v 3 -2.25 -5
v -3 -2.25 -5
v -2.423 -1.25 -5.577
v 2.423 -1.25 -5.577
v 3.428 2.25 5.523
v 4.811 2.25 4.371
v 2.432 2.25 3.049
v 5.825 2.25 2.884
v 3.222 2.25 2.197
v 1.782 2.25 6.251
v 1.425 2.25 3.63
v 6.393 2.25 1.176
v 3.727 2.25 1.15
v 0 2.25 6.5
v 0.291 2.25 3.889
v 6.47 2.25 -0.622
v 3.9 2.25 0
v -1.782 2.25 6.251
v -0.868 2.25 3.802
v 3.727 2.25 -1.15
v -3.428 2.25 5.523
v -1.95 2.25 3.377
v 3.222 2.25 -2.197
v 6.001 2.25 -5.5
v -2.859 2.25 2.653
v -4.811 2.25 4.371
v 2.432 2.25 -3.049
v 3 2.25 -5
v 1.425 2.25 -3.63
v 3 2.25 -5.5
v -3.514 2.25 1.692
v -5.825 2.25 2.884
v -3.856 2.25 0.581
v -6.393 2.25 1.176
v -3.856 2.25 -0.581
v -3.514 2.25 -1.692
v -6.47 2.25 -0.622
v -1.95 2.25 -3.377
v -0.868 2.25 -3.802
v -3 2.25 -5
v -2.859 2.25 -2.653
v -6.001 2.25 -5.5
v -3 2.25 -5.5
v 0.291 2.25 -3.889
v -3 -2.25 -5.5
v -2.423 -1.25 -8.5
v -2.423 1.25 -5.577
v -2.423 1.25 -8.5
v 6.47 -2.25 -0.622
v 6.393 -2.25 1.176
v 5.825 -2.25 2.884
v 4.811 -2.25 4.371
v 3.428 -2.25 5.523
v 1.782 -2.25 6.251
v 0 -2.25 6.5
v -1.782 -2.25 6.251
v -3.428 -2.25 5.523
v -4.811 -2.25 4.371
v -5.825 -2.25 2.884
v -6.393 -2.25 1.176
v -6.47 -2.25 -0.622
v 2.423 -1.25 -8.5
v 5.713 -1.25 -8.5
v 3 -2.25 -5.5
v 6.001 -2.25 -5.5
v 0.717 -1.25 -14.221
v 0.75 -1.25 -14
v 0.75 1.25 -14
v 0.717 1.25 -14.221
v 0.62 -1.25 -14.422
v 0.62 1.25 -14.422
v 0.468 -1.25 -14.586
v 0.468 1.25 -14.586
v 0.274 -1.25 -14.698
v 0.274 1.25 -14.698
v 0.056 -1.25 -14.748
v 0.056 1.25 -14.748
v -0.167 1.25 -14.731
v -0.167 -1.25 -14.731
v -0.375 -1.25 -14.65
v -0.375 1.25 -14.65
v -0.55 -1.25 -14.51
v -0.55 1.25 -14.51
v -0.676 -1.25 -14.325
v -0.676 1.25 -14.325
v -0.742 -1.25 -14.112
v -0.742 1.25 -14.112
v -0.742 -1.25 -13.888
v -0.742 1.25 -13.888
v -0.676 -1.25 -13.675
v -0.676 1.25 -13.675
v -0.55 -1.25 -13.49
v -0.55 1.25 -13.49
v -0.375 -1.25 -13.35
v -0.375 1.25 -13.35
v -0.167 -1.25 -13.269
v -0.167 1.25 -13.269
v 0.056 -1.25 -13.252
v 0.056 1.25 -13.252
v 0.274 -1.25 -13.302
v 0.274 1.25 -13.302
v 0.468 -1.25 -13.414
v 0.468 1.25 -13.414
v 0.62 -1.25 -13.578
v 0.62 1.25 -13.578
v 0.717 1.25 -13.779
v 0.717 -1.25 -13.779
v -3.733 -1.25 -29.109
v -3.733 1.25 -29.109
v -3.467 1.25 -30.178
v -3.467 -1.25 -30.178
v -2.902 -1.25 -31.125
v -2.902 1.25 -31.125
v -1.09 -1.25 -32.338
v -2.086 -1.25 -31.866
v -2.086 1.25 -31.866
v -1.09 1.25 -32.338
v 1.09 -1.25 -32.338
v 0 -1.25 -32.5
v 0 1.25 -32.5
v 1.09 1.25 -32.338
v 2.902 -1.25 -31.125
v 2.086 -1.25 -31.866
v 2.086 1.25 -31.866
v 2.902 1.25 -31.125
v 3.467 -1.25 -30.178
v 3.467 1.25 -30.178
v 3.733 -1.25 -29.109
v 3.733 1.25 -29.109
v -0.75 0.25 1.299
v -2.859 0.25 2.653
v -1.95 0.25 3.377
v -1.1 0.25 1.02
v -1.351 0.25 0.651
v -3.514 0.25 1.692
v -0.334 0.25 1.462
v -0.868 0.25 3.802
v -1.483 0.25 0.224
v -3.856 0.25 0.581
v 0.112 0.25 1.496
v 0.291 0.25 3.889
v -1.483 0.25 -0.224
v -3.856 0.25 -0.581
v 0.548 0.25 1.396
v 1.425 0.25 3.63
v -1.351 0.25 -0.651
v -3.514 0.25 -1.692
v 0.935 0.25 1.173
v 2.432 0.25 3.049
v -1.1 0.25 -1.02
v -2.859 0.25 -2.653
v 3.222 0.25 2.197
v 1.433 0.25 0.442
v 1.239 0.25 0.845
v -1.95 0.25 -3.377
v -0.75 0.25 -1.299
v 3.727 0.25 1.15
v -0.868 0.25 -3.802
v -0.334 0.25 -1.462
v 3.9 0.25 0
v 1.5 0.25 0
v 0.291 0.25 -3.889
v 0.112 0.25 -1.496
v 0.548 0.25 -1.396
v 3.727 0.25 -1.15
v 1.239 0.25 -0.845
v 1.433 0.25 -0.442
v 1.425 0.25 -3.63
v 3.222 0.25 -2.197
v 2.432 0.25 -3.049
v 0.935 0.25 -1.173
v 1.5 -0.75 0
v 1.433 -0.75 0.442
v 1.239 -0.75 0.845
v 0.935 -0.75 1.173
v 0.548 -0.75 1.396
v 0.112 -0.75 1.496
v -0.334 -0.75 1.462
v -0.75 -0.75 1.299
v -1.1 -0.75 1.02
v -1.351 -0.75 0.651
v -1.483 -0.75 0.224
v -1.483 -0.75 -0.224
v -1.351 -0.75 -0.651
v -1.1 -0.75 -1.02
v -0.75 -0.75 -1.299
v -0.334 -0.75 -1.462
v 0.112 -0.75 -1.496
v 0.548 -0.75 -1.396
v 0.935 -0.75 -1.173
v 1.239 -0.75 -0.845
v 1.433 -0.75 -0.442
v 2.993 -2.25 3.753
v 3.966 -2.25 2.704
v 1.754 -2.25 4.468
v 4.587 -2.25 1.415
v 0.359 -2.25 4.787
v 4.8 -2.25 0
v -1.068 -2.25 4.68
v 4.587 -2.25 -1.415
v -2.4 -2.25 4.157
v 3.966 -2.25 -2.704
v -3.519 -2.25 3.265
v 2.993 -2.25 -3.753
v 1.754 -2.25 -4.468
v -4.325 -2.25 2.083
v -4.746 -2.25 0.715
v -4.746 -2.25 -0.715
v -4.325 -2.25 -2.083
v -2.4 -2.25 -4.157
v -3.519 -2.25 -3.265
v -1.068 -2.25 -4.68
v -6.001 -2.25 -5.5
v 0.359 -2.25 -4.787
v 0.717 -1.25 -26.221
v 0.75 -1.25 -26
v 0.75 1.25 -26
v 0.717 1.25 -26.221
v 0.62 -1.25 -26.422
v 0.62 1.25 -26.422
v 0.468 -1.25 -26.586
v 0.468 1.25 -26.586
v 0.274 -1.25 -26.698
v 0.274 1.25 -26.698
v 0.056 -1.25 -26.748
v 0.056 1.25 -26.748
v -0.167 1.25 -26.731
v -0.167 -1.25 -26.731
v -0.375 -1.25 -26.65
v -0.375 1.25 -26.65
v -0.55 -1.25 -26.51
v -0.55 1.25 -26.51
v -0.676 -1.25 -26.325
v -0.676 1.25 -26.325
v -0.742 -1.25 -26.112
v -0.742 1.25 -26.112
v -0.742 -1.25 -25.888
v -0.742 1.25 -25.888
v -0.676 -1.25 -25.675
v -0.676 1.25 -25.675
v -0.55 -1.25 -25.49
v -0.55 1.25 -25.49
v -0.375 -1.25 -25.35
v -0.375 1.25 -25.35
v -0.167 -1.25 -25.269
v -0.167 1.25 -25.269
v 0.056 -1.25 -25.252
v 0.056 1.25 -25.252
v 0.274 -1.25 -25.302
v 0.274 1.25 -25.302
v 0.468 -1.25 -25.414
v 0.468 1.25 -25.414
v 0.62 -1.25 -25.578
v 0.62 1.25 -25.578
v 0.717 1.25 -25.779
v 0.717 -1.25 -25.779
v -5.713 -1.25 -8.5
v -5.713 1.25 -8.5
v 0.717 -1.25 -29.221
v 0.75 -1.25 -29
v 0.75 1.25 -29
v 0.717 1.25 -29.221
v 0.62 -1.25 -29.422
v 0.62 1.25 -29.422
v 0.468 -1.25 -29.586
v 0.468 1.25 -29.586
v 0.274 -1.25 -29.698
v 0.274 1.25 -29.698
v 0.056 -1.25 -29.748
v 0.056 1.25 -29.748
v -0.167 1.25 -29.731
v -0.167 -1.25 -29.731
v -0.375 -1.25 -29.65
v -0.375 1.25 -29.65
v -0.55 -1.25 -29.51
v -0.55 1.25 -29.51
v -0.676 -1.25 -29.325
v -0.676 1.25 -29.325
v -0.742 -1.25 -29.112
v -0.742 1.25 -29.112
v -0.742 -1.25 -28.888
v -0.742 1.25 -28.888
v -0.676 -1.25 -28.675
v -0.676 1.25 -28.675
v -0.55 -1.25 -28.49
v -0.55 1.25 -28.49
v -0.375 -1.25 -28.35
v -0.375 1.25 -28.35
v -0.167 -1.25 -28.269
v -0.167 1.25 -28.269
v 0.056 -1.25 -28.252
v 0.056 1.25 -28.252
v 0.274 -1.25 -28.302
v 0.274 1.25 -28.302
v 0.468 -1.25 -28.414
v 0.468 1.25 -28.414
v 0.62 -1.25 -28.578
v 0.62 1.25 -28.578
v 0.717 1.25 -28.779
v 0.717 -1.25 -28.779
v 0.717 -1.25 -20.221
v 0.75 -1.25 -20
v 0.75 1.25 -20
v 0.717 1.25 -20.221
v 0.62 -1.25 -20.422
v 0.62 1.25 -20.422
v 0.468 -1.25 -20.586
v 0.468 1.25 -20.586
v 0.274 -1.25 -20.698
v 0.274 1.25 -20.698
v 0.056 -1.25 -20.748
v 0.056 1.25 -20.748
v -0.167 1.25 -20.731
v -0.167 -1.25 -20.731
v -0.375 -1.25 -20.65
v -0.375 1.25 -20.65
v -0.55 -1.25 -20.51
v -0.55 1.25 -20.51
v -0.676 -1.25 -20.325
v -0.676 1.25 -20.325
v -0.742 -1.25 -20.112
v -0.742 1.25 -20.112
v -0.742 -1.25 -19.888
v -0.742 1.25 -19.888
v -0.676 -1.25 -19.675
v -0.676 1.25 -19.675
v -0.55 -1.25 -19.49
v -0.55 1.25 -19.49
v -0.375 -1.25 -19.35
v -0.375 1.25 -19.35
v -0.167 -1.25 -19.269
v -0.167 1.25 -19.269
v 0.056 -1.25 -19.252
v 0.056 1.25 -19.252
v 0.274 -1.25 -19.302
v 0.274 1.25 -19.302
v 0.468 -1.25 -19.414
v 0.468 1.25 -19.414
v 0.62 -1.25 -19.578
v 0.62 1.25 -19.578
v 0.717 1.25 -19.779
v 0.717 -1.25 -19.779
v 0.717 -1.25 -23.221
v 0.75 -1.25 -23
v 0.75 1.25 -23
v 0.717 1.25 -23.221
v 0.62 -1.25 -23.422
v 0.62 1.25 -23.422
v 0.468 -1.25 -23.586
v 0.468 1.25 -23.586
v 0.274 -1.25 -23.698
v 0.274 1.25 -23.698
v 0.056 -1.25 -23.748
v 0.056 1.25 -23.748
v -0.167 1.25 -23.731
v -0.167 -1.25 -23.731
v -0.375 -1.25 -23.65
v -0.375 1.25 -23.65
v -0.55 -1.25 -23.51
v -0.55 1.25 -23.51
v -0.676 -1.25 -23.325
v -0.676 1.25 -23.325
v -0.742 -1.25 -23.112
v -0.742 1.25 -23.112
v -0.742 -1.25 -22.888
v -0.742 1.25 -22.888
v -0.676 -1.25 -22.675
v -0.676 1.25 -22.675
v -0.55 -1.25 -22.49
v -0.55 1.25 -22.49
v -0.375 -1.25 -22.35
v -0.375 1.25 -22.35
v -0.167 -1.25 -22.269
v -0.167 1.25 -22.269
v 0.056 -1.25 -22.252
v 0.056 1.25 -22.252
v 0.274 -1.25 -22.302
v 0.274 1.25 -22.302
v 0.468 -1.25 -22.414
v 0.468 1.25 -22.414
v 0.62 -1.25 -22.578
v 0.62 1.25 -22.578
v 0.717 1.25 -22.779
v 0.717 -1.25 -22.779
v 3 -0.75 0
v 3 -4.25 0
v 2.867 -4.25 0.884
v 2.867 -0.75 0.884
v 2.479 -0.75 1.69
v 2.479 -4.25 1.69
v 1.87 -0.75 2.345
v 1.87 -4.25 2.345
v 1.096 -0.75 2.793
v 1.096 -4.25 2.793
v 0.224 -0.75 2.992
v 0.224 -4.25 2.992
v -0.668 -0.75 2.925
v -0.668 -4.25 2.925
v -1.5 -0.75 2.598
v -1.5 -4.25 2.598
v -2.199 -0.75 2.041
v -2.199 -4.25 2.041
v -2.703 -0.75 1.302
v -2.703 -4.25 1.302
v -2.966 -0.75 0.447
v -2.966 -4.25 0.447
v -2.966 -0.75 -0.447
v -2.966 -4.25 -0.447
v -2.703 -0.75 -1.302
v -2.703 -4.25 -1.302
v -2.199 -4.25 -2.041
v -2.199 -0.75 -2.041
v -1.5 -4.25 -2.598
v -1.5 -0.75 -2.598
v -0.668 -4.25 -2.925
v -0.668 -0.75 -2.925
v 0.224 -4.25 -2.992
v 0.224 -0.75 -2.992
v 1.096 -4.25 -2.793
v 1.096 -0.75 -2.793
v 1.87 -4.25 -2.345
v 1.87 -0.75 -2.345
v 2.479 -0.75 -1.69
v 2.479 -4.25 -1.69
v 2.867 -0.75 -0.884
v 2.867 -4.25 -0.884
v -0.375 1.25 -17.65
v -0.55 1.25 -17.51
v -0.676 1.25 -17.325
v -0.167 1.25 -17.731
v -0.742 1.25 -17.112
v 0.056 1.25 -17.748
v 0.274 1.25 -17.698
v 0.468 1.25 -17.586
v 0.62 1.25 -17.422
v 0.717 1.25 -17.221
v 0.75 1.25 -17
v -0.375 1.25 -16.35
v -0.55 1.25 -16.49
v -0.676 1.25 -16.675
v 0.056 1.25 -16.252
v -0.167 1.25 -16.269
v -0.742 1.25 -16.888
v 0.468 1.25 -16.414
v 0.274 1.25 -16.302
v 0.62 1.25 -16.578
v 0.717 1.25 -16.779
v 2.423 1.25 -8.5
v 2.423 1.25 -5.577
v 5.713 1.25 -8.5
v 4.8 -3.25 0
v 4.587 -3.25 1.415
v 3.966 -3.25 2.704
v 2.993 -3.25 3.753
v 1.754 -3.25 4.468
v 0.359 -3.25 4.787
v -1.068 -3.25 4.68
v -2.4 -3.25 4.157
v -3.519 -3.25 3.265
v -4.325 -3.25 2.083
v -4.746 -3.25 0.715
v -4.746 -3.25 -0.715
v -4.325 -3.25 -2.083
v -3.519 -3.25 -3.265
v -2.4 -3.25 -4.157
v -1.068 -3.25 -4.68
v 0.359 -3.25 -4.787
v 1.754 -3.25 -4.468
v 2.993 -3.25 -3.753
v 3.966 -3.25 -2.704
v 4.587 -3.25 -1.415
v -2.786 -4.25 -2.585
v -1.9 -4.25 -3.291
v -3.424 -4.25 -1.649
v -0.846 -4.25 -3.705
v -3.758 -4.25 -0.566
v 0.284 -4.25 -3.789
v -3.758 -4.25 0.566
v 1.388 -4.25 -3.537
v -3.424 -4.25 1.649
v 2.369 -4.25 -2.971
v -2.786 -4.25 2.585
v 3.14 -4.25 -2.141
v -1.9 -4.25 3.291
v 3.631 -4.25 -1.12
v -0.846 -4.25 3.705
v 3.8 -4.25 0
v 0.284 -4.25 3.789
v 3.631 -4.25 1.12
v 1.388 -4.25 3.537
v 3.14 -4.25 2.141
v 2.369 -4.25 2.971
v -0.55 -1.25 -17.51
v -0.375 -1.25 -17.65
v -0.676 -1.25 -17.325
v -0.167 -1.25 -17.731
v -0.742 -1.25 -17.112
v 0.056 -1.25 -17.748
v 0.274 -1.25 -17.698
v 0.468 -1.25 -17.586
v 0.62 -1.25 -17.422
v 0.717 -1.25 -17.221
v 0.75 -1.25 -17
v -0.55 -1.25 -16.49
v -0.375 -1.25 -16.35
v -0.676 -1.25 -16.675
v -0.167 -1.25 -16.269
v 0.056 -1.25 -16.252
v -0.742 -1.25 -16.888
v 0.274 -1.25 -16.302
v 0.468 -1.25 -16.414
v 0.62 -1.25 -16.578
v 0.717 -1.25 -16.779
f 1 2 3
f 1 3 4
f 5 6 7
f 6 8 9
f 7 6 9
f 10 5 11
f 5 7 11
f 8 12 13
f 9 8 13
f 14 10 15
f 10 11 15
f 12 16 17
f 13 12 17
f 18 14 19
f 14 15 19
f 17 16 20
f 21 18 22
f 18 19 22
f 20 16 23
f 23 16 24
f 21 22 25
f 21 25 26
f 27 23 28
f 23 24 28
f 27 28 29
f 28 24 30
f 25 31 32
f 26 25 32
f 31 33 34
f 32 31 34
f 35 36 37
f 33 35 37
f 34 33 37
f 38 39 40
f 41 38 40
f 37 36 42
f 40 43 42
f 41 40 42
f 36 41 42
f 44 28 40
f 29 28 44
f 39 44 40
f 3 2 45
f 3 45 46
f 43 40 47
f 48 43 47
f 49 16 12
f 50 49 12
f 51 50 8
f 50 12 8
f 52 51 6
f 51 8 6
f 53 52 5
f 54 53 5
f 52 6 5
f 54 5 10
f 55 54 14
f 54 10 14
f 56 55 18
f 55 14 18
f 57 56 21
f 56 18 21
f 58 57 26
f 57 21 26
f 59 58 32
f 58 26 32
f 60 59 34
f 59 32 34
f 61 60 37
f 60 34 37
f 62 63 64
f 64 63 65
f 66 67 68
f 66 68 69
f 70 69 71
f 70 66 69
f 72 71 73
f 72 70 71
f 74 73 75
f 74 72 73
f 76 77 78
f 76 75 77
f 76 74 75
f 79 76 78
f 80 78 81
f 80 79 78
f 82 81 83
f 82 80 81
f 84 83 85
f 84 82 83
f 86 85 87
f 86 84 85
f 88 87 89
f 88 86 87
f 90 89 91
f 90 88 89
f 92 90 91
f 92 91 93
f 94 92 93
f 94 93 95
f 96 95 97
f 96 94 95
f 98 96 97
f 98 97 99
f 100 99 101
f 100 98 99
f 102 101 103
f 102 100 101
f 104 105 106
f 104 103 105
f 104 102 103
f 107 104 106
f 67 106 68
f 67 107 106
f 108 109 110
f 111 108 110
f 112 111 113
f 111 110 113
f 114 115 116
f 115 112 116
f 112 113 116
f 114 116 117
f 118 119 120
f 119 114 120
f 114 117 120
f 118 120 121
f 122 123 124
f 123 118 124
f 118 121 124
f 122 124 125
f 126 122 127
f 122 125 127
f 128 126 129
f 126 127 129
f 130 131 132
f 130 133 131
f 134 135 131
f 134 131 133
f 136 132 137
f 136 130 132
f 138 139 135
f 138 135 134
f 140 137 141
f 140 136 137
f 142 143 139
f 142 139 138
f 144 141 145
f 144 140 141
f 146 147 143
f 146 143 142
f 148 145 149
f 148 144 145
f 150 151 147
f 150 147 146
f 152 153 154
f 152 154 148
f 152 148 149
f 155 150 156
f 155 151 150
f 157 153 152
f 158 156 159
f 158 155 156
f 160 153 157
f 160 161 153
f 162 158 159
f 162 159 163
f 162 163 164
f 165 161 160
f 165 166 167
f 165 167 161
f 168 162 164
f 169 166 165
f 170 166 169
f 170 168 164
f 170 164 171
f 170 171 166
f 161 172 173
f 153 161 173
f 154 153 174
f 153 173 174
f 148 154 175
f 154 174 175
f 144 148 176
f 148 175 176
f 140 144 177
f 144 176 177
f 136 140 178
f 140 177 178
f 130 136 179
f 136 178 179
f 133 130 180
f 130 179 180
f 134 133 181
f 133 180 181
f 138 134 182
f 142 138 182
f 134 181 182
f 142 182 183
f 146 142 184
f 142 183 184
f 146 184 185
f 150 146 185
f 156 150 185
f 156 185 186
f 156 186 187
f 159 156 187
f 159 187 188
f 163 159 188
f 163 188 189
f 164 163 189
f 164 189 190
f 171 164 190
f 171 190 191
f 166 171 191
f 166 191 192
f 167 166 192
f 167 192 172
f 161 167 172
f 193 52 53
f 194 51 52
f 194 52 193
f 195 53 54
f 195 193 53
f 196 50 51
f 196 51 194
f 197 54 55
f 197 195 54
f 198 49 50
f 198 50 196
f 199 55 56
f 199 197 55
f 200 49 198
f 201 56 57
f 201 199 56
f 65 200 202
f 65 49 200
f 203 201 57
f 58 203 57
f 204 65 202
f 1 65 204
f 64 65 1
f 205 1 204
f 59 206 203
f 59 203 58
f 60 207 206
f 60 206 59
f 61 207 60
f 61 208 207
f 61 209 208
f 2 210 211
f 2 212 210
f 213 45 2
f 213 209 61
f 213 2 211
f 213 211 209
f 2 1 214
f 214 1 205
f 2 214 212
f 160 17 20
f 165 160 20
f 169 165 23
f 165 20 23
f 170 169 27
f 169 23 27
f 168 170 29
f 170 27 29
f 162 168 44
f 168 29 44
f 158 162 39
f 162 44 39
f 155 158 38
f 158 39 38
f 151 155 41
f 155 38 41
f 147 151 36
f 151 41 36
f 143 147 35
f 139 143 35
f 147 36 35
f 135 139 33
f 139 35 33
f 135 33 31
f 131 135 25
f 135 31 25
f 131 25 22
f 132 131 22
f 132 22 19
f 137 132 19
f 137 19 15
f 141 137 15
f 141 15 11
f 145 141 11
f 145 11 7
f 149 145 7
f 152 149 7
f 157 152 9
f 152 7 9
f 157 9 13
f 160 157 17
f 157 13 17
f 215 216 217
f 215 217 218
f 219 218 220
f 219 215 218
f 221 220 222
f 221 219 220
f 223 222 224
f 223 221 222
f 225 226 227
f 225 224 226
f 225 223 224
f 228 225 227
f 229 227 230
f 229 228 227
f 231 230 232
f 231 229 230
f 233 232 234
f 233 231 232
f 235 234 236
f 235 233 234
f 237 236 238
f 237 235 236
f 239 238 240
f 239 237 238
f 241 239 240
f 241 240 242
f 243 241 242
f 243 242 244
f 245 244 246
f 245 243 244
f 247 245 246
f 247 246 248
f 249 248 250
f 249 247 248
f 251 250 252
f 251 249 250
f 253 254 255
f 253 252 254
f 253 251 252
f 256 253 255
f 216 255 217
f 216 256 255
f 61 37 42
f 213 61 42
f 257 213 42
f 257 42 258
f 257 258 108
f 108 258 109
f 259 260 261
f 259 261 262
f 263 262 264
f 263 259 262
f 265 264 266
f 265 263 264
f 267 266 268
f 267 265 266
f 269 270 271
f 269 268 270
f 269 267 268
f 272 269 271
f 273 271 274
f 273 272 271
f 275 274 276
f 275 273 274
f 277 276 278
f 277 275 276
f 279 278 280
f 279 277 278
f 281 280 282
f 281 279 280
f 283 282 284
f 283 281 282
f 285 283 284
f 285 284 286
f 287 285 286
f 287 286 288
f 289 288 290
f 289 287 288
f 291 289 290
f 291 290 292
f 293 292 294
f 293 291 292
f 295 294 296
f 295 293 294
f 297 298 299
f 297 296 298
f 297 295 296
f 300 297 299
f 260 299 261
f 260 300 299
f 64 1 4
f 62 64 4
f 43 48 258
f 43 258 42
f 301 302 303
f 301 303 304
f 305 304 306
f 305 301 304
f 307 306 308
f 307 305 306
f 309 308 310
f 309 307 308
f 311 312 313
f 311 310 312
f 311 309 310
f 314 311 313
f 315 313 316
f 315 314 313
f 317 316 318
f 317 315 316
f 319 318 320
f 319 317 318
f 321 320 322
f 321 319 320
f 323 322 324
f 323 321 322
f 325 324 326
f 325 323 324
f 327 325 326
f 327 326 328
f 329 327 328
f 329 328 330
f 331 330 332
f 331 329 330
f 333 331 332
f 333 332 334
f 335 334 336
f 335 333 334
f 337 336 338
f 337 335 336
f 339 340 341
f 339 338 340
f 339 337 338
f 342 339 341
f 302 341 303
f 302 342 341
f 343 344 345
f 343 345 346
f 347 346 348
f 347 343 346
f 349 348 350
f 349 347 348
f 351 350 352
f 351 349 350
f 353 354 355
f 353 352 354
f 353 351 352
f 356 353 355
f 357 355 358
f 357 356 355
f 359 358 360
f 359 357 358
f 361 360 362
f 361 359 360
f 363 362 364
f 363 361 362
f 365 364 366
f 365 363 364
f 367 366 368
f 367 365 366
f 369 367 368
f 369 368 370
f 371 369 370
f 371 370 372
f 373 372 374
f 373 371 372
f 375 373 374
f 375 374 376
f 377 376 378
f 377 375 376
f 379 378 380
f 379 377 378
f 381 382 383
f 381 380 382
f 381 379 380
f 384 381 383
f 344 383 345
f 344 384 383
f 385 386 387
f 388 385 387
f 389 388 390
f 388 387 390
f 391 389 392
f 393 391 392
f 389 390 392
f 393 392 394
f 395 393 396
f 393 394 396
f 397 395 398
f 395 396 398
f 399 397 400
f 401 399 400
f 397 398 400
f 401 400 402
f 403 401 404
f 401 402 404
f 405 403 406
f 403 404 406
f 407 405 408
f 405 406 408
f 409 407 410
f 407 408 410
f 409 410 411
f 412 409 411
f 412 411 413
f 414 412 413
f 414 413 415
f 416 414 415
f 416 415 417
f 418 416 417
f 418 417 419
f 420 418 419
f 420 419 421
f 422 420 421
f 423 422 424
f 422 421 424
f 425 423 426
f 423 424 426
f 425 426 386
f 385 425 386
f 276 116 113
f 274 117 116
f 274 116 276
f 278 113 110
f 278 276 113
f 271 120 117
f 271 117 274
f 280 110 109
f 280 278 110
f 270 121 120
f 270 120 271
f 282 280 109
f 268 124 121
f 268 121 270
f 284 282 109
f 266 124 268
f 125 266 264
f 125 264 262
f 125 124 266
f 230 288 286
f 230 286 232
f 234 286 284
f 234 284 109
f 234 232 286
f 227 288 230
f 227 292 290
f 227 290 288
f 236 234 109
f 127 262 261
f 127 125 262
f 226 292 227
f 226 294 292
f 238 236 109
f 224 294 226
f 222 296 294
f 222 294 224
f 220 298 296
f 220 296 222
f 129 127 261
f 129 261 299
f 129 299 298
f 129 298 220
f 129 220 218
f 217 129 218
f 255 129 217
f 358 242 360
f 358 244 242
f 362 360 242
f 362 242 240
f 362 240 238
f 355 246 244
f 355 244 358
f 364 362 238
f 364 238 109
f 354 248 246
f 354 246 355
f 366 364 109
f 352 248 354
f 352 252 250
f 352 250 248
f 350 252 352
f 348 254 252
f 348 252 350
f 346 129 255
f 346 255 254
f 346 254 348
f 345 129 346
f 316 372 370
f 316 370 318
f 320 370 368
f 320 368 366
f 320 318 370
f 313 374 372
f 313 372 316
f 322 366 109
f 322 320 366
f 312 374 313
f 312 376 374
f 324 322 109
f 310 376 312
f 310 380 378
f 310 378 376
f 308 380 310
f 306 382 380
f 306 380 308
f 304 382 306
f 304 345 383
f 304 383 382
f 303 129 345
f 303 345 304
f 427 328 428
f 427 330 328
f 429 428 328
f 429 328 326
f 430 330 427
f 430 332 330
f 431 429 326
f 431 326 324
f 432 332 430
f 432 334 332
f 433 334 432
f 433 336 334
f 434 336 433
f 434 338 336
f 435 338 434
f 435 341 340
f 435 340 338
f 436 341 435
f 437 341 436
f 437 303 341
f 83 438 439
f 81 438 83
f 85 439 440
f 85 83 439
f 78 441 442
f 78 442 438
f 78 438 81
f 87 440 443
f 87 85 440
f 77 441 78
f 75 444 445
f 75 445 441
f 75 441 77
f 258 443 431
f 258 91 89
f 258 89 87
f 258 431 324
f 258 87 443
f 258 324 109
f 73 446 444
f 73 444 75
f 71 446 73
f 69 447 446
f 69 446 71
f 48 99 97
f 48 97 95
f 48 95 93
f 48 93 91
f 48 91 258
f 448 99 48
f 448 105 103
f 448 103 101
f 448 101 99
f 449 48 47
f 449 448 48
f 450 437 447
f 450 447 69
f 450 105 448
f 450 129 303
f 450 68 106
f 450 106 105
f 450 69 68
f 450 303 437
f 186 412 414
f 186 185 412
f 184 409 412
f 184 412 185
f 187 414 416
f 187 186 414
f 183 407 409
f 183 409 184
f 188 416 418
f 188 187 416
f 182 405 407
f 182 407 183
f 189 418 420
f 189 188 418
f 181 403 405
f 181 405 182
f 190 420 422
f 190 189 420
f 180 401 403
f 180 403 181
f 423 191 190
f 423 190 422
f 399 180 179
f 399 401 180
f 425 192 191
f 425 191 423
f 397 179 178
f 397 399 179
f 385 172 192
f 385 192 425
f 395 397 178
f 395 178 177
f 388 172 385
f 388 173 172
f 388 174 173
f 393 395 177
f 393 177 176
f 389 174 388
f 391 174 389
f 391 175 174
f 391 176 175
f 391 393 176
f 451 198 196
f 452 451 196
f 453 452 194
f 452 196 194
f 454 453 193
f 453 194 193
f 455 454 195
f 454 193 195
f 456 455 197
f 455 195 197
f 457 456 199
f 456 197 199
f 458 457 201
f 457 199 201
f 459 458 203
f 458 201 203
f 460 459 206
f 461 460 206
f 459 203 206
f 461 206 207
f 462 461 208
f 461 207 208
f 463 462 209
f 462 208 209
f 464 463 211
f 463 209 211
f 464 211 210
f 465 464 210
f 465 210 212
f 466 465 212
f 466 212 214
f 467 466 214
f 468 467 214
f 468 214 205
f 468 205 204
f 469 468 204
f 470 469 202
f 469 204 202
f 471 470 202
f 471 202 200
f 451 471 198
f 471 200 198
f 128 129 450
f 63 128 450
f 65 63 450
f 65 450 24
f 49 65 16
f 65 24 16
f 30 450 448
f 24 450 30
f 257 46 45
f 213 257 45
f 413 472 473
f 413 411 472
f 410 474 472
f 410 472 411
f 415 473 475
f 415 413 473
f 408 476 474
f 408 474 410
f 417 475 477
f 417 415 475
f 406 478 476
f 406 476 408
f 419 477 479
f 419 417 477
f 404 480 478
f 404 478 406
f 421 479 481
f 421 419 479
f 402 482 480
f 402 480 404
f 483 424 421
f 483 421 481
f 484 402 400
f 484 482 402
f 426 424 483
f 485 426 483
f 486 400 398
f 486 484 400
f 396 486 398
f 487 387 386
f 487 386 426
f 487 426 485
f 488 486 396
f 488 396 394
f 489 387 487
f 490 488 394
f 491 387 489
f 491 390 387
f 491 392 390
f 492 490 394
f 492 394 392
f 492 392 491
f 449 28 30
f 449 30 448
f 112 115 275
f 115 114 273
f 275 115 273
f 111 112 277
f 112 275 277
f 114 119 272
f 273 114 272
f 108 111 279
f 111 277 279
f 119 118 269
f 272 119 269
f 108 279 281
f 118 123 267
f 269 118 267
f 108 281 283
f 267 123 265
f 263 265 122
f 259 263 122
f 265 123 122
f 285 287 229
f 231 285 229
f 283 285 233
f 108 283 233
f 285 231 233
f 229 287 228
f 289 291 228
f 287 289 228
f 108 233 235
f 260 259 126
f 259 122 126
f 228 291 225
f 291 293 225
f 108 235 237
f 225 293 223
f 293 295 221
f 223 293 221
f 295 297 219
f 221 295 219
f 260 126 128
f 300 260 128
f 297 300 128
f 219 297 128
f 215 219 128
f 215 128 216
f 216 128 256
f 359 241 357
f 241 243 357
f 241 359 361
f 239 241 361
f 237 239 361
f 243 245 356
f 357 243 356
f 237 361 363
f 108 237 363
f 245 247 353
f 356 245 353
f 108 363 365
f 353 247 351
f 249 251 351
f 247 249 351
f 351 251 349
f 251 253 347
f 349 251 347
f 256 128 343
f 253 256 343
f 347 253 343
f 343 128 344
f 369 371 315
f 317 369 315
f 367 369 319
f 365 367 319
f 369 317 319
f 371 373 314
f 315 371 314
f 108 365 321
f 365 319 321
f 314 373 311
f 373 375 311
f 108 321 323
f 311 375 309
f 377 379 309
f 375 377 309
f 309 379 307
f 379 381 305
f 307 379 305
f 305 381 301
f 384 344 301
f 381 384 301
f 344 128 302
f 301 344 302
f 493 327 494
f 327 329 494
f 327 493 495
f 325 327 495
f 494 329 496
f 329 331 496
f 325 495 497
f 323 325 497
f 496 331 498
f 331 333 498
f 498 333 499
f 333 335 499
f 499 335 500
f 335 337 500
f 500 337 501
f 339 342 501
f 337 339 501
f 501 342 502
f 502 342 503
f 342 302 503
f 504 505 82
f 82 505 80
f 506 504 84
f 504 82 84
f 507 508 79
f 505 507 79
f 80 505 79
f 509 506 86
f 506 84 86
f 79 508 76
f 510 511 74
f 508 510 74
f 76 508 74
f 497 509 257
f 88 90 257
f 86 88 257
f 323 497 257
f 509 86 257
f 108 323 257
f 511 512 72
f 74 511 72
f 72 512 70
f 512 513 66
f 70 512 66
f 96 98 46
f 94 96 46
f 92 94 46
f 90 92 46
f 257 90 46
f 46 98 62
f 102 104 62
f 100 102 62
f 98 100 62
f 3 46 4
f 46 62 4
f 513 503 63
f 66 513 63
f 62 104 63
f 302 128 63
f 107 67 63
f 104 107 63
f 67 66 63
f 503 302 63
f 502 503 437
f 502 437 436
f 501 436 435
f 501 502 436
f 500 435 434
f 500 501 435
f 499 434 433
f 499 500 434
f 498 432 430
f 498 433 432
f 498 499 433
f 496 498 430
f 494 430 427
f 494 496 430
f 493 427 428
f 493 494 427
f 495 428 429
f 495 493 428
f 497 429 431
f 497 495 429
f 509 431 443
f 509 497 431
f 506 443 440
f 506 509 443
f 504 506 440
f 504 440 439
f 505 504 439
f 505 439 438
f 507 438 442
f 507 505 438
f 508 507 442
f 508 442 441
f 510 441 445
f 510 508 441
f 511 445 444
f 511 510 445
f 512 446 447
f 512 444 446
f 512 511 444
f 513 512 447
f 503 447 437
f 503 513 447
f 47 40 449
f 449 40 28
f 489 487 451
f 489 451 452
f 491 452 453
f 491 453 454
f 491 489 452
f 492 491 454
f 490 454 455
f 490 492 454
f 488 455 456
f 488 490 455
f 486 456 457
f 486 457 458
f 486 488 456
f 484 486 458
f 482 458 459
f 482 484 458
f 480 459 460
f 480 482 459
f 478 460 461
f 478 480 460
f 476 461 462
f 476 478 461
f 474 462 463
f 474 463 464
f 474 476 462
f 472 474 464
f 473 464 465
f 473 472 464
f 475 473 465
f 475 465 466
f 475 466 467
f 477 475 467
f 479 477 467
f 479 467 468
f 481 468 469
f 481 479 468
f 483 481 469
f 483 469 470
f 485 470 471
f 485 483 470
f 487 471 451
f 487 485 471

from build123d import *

# Parameters (mm, degrees)
SKETCH1_R           = 0.75
BOSS_EXTRUDE1_DEPTH = 2.25
CUT_EXTRUDE1_DEPTH  = 7
SKETCH3_W           = 6
SKETCH3_H           = 3.5
CUT_EXTRUDE2_DEPTH  = 1
DRAFT1_ANGLE        = 30
DRAFT2_ANGLE        = 30
SKETCH4_R           = 3.9
CUT_EXTRUDE3_DEPTH  = 2
SKETCH5_R           = 4.8
BOSS_EXTRUDE2_DEPTH = 2
CHAMFER1_SIZE       = 1
SKETCH6_R           = 3
CUT_EXTRUDE4_DEPTH  = 3.5
SKETCH7_R           = 1.5
CUT_EXTRUDE5_DEPTH  = 4


with BuildPart() as part:
    # Sketch1 → Boss-Extrude1 (new body, symmetric)
    with BuildSketch(Plane(origin=(0, 0, 0), x_dir=(1, 0, 0), z_dir=(0, 1, 0))):
        with BuildLine():
            Line((-6.470196323, 0.62173913), (-3.732805571, 29.108695652))
            ThreePointArc((-3.732805571, 29.108695652), (0, 32.5), (3.732805571, 29.108695652))
            Line((3.732805571, 29.108695652), (6.470196323, 0.62173913))
            ThreePointArc((6.470196323, 0.62173913), (0, -6.5), (-6.470196323, 0.62173913))
        make_face()
        with Locations((0, 29)):
            Circle(SKETCH1_R, mode=Mode.SUBTRACT)
        with Locations((0, 26)):
            Circle(SKETCH1_R, mode=Mode.SUBTRACT)
        with Locations((0, 23)):
            Circle(SKETCH1_R, mode=Mode.SUBTRACT)
        with Locations((0, 20)):
            Circle(SKETCH1_R, mode=Mode.SUBTRACT)
        with Locations((0, 17)):
            Circle(SKETCH1_R, mode=Mode.SUBTRACT)
        with Locations((0, 14)):
            Circle(SKETCH1_R, mode=Mode.SUBTRACT)
    extrude(amount=BOSS_EXTRUDE1_DEPTH, both=True)

    # Sketch2 → Cut-Extrude1 (cut, symmetric)
    with BuildSketch(Plane(origin=(0, 0, 0), x_dir=(0, 0, -1), z_dir=(1, 0, 0))):
        Polygon((5.5, 2.25), (32.5, 2.25), (32.5, 1.25), (8.5, 1.25), align=None)
    cut_extrude1 = extrude(amount=CUT_EXTRUDE1_DEPTH, both=True, mode=Mode.SUBTRACT)

    # Sketch3 → Cut-Extrude2 (cut)
    with BuildSketch(Plane(origin=(0, 2.25, 0), x_dir=(1, 0, 0), z_dir=(0, 1, 0))):
        with Locations((0, 6.75)):
            Rectangle(SKETCH3_W, SKETCH3_H)
    cut_extrude2 = extrude(amount=-CUT_EXTRUDE2_DEPTH, mode=Mode.SUBTRACT)

    # Mirror1: Cut-Extrude1, Cut-Extrude2 across plane
    add(cut_extrude1.mirror(Plane.ZX), mode=Mode.SUBTRACT)
    add(cut_extrude2.mirror(Plane.ZX), mode=Mode.SUBTRACT)

    # Draft1
    draft1_faces = [part.faces().sort_by_distance(p)[0] for p in [
        (0, 1.75, -5),
        (-3, 1.625, -6.1875),
        (3, 1.625, -6.1875),
    ]]
    draft(draft1_faces, Plane.ZX.offset(2.25), DRAFT1_ANGLE)

    # Draft2
    draft2_faces = [part.faces().sort_by_distance(p)[0] for p in [
        (-3, -1.625, -6.1875),
        (0, -1.75, -5),
        (3, -1.625, -6.1875),
    ]]
    draft(draft2_faces, Plane(origin=(0, -2.25, 0), x_dir=(0, 0, -1), z_dir=(0, -1, 0)), DRAFT2_ANGLE)

    # Sketch4 → Cut-Extrude3 (cut)
    with BuildSketch(Plane(origin=(0, 2.25, 0), x_dir=(1, 0, 0), z_dir=(0, 1, 0))):
        Circle(SKETCH4_R)
    extrude(amount=-CUT_EXTRUDE3_DEPTH, mode=Mode.SUBTRACT)

    # Sketch5 → Boss-Extrude2 (add)
    with BuildSketch(Plane.XZ.offset(2.25)):
        Circle(SKETCH5_R)
    extrude(amount=BOSS_EXTRUDE2_DEPTH)

    # Chamfer1
    chamfer1_edges = [part.edges().sort_by_distance(p)[0] for p in [
        (-4.8, -4.25, 0),
    ]]
    chamfer(chamfer1_edges, length=CHAMFER1_SIZE)

    # Sketch6 → Cut-Extrude4 (cut)
    with BuildSketch(Plane.XZ.offset(4.25)):
        Circle(SKETCH6_R)
    extrude(amount=-CUT_EXTRUDE4_DEPTH, mode=Mode.SUBTRACT)

    # Sketch7 → Cut-Extrude5 (cut, through all)
    with BuildSketch(Plane.XZ.offset(0.75)):
        Circle(SKETCH7_R)
    extrude(amount=-CUT_EXTRUDE5_DEPTH, mode=Mode.SUBTRACT)


solid = part.part
